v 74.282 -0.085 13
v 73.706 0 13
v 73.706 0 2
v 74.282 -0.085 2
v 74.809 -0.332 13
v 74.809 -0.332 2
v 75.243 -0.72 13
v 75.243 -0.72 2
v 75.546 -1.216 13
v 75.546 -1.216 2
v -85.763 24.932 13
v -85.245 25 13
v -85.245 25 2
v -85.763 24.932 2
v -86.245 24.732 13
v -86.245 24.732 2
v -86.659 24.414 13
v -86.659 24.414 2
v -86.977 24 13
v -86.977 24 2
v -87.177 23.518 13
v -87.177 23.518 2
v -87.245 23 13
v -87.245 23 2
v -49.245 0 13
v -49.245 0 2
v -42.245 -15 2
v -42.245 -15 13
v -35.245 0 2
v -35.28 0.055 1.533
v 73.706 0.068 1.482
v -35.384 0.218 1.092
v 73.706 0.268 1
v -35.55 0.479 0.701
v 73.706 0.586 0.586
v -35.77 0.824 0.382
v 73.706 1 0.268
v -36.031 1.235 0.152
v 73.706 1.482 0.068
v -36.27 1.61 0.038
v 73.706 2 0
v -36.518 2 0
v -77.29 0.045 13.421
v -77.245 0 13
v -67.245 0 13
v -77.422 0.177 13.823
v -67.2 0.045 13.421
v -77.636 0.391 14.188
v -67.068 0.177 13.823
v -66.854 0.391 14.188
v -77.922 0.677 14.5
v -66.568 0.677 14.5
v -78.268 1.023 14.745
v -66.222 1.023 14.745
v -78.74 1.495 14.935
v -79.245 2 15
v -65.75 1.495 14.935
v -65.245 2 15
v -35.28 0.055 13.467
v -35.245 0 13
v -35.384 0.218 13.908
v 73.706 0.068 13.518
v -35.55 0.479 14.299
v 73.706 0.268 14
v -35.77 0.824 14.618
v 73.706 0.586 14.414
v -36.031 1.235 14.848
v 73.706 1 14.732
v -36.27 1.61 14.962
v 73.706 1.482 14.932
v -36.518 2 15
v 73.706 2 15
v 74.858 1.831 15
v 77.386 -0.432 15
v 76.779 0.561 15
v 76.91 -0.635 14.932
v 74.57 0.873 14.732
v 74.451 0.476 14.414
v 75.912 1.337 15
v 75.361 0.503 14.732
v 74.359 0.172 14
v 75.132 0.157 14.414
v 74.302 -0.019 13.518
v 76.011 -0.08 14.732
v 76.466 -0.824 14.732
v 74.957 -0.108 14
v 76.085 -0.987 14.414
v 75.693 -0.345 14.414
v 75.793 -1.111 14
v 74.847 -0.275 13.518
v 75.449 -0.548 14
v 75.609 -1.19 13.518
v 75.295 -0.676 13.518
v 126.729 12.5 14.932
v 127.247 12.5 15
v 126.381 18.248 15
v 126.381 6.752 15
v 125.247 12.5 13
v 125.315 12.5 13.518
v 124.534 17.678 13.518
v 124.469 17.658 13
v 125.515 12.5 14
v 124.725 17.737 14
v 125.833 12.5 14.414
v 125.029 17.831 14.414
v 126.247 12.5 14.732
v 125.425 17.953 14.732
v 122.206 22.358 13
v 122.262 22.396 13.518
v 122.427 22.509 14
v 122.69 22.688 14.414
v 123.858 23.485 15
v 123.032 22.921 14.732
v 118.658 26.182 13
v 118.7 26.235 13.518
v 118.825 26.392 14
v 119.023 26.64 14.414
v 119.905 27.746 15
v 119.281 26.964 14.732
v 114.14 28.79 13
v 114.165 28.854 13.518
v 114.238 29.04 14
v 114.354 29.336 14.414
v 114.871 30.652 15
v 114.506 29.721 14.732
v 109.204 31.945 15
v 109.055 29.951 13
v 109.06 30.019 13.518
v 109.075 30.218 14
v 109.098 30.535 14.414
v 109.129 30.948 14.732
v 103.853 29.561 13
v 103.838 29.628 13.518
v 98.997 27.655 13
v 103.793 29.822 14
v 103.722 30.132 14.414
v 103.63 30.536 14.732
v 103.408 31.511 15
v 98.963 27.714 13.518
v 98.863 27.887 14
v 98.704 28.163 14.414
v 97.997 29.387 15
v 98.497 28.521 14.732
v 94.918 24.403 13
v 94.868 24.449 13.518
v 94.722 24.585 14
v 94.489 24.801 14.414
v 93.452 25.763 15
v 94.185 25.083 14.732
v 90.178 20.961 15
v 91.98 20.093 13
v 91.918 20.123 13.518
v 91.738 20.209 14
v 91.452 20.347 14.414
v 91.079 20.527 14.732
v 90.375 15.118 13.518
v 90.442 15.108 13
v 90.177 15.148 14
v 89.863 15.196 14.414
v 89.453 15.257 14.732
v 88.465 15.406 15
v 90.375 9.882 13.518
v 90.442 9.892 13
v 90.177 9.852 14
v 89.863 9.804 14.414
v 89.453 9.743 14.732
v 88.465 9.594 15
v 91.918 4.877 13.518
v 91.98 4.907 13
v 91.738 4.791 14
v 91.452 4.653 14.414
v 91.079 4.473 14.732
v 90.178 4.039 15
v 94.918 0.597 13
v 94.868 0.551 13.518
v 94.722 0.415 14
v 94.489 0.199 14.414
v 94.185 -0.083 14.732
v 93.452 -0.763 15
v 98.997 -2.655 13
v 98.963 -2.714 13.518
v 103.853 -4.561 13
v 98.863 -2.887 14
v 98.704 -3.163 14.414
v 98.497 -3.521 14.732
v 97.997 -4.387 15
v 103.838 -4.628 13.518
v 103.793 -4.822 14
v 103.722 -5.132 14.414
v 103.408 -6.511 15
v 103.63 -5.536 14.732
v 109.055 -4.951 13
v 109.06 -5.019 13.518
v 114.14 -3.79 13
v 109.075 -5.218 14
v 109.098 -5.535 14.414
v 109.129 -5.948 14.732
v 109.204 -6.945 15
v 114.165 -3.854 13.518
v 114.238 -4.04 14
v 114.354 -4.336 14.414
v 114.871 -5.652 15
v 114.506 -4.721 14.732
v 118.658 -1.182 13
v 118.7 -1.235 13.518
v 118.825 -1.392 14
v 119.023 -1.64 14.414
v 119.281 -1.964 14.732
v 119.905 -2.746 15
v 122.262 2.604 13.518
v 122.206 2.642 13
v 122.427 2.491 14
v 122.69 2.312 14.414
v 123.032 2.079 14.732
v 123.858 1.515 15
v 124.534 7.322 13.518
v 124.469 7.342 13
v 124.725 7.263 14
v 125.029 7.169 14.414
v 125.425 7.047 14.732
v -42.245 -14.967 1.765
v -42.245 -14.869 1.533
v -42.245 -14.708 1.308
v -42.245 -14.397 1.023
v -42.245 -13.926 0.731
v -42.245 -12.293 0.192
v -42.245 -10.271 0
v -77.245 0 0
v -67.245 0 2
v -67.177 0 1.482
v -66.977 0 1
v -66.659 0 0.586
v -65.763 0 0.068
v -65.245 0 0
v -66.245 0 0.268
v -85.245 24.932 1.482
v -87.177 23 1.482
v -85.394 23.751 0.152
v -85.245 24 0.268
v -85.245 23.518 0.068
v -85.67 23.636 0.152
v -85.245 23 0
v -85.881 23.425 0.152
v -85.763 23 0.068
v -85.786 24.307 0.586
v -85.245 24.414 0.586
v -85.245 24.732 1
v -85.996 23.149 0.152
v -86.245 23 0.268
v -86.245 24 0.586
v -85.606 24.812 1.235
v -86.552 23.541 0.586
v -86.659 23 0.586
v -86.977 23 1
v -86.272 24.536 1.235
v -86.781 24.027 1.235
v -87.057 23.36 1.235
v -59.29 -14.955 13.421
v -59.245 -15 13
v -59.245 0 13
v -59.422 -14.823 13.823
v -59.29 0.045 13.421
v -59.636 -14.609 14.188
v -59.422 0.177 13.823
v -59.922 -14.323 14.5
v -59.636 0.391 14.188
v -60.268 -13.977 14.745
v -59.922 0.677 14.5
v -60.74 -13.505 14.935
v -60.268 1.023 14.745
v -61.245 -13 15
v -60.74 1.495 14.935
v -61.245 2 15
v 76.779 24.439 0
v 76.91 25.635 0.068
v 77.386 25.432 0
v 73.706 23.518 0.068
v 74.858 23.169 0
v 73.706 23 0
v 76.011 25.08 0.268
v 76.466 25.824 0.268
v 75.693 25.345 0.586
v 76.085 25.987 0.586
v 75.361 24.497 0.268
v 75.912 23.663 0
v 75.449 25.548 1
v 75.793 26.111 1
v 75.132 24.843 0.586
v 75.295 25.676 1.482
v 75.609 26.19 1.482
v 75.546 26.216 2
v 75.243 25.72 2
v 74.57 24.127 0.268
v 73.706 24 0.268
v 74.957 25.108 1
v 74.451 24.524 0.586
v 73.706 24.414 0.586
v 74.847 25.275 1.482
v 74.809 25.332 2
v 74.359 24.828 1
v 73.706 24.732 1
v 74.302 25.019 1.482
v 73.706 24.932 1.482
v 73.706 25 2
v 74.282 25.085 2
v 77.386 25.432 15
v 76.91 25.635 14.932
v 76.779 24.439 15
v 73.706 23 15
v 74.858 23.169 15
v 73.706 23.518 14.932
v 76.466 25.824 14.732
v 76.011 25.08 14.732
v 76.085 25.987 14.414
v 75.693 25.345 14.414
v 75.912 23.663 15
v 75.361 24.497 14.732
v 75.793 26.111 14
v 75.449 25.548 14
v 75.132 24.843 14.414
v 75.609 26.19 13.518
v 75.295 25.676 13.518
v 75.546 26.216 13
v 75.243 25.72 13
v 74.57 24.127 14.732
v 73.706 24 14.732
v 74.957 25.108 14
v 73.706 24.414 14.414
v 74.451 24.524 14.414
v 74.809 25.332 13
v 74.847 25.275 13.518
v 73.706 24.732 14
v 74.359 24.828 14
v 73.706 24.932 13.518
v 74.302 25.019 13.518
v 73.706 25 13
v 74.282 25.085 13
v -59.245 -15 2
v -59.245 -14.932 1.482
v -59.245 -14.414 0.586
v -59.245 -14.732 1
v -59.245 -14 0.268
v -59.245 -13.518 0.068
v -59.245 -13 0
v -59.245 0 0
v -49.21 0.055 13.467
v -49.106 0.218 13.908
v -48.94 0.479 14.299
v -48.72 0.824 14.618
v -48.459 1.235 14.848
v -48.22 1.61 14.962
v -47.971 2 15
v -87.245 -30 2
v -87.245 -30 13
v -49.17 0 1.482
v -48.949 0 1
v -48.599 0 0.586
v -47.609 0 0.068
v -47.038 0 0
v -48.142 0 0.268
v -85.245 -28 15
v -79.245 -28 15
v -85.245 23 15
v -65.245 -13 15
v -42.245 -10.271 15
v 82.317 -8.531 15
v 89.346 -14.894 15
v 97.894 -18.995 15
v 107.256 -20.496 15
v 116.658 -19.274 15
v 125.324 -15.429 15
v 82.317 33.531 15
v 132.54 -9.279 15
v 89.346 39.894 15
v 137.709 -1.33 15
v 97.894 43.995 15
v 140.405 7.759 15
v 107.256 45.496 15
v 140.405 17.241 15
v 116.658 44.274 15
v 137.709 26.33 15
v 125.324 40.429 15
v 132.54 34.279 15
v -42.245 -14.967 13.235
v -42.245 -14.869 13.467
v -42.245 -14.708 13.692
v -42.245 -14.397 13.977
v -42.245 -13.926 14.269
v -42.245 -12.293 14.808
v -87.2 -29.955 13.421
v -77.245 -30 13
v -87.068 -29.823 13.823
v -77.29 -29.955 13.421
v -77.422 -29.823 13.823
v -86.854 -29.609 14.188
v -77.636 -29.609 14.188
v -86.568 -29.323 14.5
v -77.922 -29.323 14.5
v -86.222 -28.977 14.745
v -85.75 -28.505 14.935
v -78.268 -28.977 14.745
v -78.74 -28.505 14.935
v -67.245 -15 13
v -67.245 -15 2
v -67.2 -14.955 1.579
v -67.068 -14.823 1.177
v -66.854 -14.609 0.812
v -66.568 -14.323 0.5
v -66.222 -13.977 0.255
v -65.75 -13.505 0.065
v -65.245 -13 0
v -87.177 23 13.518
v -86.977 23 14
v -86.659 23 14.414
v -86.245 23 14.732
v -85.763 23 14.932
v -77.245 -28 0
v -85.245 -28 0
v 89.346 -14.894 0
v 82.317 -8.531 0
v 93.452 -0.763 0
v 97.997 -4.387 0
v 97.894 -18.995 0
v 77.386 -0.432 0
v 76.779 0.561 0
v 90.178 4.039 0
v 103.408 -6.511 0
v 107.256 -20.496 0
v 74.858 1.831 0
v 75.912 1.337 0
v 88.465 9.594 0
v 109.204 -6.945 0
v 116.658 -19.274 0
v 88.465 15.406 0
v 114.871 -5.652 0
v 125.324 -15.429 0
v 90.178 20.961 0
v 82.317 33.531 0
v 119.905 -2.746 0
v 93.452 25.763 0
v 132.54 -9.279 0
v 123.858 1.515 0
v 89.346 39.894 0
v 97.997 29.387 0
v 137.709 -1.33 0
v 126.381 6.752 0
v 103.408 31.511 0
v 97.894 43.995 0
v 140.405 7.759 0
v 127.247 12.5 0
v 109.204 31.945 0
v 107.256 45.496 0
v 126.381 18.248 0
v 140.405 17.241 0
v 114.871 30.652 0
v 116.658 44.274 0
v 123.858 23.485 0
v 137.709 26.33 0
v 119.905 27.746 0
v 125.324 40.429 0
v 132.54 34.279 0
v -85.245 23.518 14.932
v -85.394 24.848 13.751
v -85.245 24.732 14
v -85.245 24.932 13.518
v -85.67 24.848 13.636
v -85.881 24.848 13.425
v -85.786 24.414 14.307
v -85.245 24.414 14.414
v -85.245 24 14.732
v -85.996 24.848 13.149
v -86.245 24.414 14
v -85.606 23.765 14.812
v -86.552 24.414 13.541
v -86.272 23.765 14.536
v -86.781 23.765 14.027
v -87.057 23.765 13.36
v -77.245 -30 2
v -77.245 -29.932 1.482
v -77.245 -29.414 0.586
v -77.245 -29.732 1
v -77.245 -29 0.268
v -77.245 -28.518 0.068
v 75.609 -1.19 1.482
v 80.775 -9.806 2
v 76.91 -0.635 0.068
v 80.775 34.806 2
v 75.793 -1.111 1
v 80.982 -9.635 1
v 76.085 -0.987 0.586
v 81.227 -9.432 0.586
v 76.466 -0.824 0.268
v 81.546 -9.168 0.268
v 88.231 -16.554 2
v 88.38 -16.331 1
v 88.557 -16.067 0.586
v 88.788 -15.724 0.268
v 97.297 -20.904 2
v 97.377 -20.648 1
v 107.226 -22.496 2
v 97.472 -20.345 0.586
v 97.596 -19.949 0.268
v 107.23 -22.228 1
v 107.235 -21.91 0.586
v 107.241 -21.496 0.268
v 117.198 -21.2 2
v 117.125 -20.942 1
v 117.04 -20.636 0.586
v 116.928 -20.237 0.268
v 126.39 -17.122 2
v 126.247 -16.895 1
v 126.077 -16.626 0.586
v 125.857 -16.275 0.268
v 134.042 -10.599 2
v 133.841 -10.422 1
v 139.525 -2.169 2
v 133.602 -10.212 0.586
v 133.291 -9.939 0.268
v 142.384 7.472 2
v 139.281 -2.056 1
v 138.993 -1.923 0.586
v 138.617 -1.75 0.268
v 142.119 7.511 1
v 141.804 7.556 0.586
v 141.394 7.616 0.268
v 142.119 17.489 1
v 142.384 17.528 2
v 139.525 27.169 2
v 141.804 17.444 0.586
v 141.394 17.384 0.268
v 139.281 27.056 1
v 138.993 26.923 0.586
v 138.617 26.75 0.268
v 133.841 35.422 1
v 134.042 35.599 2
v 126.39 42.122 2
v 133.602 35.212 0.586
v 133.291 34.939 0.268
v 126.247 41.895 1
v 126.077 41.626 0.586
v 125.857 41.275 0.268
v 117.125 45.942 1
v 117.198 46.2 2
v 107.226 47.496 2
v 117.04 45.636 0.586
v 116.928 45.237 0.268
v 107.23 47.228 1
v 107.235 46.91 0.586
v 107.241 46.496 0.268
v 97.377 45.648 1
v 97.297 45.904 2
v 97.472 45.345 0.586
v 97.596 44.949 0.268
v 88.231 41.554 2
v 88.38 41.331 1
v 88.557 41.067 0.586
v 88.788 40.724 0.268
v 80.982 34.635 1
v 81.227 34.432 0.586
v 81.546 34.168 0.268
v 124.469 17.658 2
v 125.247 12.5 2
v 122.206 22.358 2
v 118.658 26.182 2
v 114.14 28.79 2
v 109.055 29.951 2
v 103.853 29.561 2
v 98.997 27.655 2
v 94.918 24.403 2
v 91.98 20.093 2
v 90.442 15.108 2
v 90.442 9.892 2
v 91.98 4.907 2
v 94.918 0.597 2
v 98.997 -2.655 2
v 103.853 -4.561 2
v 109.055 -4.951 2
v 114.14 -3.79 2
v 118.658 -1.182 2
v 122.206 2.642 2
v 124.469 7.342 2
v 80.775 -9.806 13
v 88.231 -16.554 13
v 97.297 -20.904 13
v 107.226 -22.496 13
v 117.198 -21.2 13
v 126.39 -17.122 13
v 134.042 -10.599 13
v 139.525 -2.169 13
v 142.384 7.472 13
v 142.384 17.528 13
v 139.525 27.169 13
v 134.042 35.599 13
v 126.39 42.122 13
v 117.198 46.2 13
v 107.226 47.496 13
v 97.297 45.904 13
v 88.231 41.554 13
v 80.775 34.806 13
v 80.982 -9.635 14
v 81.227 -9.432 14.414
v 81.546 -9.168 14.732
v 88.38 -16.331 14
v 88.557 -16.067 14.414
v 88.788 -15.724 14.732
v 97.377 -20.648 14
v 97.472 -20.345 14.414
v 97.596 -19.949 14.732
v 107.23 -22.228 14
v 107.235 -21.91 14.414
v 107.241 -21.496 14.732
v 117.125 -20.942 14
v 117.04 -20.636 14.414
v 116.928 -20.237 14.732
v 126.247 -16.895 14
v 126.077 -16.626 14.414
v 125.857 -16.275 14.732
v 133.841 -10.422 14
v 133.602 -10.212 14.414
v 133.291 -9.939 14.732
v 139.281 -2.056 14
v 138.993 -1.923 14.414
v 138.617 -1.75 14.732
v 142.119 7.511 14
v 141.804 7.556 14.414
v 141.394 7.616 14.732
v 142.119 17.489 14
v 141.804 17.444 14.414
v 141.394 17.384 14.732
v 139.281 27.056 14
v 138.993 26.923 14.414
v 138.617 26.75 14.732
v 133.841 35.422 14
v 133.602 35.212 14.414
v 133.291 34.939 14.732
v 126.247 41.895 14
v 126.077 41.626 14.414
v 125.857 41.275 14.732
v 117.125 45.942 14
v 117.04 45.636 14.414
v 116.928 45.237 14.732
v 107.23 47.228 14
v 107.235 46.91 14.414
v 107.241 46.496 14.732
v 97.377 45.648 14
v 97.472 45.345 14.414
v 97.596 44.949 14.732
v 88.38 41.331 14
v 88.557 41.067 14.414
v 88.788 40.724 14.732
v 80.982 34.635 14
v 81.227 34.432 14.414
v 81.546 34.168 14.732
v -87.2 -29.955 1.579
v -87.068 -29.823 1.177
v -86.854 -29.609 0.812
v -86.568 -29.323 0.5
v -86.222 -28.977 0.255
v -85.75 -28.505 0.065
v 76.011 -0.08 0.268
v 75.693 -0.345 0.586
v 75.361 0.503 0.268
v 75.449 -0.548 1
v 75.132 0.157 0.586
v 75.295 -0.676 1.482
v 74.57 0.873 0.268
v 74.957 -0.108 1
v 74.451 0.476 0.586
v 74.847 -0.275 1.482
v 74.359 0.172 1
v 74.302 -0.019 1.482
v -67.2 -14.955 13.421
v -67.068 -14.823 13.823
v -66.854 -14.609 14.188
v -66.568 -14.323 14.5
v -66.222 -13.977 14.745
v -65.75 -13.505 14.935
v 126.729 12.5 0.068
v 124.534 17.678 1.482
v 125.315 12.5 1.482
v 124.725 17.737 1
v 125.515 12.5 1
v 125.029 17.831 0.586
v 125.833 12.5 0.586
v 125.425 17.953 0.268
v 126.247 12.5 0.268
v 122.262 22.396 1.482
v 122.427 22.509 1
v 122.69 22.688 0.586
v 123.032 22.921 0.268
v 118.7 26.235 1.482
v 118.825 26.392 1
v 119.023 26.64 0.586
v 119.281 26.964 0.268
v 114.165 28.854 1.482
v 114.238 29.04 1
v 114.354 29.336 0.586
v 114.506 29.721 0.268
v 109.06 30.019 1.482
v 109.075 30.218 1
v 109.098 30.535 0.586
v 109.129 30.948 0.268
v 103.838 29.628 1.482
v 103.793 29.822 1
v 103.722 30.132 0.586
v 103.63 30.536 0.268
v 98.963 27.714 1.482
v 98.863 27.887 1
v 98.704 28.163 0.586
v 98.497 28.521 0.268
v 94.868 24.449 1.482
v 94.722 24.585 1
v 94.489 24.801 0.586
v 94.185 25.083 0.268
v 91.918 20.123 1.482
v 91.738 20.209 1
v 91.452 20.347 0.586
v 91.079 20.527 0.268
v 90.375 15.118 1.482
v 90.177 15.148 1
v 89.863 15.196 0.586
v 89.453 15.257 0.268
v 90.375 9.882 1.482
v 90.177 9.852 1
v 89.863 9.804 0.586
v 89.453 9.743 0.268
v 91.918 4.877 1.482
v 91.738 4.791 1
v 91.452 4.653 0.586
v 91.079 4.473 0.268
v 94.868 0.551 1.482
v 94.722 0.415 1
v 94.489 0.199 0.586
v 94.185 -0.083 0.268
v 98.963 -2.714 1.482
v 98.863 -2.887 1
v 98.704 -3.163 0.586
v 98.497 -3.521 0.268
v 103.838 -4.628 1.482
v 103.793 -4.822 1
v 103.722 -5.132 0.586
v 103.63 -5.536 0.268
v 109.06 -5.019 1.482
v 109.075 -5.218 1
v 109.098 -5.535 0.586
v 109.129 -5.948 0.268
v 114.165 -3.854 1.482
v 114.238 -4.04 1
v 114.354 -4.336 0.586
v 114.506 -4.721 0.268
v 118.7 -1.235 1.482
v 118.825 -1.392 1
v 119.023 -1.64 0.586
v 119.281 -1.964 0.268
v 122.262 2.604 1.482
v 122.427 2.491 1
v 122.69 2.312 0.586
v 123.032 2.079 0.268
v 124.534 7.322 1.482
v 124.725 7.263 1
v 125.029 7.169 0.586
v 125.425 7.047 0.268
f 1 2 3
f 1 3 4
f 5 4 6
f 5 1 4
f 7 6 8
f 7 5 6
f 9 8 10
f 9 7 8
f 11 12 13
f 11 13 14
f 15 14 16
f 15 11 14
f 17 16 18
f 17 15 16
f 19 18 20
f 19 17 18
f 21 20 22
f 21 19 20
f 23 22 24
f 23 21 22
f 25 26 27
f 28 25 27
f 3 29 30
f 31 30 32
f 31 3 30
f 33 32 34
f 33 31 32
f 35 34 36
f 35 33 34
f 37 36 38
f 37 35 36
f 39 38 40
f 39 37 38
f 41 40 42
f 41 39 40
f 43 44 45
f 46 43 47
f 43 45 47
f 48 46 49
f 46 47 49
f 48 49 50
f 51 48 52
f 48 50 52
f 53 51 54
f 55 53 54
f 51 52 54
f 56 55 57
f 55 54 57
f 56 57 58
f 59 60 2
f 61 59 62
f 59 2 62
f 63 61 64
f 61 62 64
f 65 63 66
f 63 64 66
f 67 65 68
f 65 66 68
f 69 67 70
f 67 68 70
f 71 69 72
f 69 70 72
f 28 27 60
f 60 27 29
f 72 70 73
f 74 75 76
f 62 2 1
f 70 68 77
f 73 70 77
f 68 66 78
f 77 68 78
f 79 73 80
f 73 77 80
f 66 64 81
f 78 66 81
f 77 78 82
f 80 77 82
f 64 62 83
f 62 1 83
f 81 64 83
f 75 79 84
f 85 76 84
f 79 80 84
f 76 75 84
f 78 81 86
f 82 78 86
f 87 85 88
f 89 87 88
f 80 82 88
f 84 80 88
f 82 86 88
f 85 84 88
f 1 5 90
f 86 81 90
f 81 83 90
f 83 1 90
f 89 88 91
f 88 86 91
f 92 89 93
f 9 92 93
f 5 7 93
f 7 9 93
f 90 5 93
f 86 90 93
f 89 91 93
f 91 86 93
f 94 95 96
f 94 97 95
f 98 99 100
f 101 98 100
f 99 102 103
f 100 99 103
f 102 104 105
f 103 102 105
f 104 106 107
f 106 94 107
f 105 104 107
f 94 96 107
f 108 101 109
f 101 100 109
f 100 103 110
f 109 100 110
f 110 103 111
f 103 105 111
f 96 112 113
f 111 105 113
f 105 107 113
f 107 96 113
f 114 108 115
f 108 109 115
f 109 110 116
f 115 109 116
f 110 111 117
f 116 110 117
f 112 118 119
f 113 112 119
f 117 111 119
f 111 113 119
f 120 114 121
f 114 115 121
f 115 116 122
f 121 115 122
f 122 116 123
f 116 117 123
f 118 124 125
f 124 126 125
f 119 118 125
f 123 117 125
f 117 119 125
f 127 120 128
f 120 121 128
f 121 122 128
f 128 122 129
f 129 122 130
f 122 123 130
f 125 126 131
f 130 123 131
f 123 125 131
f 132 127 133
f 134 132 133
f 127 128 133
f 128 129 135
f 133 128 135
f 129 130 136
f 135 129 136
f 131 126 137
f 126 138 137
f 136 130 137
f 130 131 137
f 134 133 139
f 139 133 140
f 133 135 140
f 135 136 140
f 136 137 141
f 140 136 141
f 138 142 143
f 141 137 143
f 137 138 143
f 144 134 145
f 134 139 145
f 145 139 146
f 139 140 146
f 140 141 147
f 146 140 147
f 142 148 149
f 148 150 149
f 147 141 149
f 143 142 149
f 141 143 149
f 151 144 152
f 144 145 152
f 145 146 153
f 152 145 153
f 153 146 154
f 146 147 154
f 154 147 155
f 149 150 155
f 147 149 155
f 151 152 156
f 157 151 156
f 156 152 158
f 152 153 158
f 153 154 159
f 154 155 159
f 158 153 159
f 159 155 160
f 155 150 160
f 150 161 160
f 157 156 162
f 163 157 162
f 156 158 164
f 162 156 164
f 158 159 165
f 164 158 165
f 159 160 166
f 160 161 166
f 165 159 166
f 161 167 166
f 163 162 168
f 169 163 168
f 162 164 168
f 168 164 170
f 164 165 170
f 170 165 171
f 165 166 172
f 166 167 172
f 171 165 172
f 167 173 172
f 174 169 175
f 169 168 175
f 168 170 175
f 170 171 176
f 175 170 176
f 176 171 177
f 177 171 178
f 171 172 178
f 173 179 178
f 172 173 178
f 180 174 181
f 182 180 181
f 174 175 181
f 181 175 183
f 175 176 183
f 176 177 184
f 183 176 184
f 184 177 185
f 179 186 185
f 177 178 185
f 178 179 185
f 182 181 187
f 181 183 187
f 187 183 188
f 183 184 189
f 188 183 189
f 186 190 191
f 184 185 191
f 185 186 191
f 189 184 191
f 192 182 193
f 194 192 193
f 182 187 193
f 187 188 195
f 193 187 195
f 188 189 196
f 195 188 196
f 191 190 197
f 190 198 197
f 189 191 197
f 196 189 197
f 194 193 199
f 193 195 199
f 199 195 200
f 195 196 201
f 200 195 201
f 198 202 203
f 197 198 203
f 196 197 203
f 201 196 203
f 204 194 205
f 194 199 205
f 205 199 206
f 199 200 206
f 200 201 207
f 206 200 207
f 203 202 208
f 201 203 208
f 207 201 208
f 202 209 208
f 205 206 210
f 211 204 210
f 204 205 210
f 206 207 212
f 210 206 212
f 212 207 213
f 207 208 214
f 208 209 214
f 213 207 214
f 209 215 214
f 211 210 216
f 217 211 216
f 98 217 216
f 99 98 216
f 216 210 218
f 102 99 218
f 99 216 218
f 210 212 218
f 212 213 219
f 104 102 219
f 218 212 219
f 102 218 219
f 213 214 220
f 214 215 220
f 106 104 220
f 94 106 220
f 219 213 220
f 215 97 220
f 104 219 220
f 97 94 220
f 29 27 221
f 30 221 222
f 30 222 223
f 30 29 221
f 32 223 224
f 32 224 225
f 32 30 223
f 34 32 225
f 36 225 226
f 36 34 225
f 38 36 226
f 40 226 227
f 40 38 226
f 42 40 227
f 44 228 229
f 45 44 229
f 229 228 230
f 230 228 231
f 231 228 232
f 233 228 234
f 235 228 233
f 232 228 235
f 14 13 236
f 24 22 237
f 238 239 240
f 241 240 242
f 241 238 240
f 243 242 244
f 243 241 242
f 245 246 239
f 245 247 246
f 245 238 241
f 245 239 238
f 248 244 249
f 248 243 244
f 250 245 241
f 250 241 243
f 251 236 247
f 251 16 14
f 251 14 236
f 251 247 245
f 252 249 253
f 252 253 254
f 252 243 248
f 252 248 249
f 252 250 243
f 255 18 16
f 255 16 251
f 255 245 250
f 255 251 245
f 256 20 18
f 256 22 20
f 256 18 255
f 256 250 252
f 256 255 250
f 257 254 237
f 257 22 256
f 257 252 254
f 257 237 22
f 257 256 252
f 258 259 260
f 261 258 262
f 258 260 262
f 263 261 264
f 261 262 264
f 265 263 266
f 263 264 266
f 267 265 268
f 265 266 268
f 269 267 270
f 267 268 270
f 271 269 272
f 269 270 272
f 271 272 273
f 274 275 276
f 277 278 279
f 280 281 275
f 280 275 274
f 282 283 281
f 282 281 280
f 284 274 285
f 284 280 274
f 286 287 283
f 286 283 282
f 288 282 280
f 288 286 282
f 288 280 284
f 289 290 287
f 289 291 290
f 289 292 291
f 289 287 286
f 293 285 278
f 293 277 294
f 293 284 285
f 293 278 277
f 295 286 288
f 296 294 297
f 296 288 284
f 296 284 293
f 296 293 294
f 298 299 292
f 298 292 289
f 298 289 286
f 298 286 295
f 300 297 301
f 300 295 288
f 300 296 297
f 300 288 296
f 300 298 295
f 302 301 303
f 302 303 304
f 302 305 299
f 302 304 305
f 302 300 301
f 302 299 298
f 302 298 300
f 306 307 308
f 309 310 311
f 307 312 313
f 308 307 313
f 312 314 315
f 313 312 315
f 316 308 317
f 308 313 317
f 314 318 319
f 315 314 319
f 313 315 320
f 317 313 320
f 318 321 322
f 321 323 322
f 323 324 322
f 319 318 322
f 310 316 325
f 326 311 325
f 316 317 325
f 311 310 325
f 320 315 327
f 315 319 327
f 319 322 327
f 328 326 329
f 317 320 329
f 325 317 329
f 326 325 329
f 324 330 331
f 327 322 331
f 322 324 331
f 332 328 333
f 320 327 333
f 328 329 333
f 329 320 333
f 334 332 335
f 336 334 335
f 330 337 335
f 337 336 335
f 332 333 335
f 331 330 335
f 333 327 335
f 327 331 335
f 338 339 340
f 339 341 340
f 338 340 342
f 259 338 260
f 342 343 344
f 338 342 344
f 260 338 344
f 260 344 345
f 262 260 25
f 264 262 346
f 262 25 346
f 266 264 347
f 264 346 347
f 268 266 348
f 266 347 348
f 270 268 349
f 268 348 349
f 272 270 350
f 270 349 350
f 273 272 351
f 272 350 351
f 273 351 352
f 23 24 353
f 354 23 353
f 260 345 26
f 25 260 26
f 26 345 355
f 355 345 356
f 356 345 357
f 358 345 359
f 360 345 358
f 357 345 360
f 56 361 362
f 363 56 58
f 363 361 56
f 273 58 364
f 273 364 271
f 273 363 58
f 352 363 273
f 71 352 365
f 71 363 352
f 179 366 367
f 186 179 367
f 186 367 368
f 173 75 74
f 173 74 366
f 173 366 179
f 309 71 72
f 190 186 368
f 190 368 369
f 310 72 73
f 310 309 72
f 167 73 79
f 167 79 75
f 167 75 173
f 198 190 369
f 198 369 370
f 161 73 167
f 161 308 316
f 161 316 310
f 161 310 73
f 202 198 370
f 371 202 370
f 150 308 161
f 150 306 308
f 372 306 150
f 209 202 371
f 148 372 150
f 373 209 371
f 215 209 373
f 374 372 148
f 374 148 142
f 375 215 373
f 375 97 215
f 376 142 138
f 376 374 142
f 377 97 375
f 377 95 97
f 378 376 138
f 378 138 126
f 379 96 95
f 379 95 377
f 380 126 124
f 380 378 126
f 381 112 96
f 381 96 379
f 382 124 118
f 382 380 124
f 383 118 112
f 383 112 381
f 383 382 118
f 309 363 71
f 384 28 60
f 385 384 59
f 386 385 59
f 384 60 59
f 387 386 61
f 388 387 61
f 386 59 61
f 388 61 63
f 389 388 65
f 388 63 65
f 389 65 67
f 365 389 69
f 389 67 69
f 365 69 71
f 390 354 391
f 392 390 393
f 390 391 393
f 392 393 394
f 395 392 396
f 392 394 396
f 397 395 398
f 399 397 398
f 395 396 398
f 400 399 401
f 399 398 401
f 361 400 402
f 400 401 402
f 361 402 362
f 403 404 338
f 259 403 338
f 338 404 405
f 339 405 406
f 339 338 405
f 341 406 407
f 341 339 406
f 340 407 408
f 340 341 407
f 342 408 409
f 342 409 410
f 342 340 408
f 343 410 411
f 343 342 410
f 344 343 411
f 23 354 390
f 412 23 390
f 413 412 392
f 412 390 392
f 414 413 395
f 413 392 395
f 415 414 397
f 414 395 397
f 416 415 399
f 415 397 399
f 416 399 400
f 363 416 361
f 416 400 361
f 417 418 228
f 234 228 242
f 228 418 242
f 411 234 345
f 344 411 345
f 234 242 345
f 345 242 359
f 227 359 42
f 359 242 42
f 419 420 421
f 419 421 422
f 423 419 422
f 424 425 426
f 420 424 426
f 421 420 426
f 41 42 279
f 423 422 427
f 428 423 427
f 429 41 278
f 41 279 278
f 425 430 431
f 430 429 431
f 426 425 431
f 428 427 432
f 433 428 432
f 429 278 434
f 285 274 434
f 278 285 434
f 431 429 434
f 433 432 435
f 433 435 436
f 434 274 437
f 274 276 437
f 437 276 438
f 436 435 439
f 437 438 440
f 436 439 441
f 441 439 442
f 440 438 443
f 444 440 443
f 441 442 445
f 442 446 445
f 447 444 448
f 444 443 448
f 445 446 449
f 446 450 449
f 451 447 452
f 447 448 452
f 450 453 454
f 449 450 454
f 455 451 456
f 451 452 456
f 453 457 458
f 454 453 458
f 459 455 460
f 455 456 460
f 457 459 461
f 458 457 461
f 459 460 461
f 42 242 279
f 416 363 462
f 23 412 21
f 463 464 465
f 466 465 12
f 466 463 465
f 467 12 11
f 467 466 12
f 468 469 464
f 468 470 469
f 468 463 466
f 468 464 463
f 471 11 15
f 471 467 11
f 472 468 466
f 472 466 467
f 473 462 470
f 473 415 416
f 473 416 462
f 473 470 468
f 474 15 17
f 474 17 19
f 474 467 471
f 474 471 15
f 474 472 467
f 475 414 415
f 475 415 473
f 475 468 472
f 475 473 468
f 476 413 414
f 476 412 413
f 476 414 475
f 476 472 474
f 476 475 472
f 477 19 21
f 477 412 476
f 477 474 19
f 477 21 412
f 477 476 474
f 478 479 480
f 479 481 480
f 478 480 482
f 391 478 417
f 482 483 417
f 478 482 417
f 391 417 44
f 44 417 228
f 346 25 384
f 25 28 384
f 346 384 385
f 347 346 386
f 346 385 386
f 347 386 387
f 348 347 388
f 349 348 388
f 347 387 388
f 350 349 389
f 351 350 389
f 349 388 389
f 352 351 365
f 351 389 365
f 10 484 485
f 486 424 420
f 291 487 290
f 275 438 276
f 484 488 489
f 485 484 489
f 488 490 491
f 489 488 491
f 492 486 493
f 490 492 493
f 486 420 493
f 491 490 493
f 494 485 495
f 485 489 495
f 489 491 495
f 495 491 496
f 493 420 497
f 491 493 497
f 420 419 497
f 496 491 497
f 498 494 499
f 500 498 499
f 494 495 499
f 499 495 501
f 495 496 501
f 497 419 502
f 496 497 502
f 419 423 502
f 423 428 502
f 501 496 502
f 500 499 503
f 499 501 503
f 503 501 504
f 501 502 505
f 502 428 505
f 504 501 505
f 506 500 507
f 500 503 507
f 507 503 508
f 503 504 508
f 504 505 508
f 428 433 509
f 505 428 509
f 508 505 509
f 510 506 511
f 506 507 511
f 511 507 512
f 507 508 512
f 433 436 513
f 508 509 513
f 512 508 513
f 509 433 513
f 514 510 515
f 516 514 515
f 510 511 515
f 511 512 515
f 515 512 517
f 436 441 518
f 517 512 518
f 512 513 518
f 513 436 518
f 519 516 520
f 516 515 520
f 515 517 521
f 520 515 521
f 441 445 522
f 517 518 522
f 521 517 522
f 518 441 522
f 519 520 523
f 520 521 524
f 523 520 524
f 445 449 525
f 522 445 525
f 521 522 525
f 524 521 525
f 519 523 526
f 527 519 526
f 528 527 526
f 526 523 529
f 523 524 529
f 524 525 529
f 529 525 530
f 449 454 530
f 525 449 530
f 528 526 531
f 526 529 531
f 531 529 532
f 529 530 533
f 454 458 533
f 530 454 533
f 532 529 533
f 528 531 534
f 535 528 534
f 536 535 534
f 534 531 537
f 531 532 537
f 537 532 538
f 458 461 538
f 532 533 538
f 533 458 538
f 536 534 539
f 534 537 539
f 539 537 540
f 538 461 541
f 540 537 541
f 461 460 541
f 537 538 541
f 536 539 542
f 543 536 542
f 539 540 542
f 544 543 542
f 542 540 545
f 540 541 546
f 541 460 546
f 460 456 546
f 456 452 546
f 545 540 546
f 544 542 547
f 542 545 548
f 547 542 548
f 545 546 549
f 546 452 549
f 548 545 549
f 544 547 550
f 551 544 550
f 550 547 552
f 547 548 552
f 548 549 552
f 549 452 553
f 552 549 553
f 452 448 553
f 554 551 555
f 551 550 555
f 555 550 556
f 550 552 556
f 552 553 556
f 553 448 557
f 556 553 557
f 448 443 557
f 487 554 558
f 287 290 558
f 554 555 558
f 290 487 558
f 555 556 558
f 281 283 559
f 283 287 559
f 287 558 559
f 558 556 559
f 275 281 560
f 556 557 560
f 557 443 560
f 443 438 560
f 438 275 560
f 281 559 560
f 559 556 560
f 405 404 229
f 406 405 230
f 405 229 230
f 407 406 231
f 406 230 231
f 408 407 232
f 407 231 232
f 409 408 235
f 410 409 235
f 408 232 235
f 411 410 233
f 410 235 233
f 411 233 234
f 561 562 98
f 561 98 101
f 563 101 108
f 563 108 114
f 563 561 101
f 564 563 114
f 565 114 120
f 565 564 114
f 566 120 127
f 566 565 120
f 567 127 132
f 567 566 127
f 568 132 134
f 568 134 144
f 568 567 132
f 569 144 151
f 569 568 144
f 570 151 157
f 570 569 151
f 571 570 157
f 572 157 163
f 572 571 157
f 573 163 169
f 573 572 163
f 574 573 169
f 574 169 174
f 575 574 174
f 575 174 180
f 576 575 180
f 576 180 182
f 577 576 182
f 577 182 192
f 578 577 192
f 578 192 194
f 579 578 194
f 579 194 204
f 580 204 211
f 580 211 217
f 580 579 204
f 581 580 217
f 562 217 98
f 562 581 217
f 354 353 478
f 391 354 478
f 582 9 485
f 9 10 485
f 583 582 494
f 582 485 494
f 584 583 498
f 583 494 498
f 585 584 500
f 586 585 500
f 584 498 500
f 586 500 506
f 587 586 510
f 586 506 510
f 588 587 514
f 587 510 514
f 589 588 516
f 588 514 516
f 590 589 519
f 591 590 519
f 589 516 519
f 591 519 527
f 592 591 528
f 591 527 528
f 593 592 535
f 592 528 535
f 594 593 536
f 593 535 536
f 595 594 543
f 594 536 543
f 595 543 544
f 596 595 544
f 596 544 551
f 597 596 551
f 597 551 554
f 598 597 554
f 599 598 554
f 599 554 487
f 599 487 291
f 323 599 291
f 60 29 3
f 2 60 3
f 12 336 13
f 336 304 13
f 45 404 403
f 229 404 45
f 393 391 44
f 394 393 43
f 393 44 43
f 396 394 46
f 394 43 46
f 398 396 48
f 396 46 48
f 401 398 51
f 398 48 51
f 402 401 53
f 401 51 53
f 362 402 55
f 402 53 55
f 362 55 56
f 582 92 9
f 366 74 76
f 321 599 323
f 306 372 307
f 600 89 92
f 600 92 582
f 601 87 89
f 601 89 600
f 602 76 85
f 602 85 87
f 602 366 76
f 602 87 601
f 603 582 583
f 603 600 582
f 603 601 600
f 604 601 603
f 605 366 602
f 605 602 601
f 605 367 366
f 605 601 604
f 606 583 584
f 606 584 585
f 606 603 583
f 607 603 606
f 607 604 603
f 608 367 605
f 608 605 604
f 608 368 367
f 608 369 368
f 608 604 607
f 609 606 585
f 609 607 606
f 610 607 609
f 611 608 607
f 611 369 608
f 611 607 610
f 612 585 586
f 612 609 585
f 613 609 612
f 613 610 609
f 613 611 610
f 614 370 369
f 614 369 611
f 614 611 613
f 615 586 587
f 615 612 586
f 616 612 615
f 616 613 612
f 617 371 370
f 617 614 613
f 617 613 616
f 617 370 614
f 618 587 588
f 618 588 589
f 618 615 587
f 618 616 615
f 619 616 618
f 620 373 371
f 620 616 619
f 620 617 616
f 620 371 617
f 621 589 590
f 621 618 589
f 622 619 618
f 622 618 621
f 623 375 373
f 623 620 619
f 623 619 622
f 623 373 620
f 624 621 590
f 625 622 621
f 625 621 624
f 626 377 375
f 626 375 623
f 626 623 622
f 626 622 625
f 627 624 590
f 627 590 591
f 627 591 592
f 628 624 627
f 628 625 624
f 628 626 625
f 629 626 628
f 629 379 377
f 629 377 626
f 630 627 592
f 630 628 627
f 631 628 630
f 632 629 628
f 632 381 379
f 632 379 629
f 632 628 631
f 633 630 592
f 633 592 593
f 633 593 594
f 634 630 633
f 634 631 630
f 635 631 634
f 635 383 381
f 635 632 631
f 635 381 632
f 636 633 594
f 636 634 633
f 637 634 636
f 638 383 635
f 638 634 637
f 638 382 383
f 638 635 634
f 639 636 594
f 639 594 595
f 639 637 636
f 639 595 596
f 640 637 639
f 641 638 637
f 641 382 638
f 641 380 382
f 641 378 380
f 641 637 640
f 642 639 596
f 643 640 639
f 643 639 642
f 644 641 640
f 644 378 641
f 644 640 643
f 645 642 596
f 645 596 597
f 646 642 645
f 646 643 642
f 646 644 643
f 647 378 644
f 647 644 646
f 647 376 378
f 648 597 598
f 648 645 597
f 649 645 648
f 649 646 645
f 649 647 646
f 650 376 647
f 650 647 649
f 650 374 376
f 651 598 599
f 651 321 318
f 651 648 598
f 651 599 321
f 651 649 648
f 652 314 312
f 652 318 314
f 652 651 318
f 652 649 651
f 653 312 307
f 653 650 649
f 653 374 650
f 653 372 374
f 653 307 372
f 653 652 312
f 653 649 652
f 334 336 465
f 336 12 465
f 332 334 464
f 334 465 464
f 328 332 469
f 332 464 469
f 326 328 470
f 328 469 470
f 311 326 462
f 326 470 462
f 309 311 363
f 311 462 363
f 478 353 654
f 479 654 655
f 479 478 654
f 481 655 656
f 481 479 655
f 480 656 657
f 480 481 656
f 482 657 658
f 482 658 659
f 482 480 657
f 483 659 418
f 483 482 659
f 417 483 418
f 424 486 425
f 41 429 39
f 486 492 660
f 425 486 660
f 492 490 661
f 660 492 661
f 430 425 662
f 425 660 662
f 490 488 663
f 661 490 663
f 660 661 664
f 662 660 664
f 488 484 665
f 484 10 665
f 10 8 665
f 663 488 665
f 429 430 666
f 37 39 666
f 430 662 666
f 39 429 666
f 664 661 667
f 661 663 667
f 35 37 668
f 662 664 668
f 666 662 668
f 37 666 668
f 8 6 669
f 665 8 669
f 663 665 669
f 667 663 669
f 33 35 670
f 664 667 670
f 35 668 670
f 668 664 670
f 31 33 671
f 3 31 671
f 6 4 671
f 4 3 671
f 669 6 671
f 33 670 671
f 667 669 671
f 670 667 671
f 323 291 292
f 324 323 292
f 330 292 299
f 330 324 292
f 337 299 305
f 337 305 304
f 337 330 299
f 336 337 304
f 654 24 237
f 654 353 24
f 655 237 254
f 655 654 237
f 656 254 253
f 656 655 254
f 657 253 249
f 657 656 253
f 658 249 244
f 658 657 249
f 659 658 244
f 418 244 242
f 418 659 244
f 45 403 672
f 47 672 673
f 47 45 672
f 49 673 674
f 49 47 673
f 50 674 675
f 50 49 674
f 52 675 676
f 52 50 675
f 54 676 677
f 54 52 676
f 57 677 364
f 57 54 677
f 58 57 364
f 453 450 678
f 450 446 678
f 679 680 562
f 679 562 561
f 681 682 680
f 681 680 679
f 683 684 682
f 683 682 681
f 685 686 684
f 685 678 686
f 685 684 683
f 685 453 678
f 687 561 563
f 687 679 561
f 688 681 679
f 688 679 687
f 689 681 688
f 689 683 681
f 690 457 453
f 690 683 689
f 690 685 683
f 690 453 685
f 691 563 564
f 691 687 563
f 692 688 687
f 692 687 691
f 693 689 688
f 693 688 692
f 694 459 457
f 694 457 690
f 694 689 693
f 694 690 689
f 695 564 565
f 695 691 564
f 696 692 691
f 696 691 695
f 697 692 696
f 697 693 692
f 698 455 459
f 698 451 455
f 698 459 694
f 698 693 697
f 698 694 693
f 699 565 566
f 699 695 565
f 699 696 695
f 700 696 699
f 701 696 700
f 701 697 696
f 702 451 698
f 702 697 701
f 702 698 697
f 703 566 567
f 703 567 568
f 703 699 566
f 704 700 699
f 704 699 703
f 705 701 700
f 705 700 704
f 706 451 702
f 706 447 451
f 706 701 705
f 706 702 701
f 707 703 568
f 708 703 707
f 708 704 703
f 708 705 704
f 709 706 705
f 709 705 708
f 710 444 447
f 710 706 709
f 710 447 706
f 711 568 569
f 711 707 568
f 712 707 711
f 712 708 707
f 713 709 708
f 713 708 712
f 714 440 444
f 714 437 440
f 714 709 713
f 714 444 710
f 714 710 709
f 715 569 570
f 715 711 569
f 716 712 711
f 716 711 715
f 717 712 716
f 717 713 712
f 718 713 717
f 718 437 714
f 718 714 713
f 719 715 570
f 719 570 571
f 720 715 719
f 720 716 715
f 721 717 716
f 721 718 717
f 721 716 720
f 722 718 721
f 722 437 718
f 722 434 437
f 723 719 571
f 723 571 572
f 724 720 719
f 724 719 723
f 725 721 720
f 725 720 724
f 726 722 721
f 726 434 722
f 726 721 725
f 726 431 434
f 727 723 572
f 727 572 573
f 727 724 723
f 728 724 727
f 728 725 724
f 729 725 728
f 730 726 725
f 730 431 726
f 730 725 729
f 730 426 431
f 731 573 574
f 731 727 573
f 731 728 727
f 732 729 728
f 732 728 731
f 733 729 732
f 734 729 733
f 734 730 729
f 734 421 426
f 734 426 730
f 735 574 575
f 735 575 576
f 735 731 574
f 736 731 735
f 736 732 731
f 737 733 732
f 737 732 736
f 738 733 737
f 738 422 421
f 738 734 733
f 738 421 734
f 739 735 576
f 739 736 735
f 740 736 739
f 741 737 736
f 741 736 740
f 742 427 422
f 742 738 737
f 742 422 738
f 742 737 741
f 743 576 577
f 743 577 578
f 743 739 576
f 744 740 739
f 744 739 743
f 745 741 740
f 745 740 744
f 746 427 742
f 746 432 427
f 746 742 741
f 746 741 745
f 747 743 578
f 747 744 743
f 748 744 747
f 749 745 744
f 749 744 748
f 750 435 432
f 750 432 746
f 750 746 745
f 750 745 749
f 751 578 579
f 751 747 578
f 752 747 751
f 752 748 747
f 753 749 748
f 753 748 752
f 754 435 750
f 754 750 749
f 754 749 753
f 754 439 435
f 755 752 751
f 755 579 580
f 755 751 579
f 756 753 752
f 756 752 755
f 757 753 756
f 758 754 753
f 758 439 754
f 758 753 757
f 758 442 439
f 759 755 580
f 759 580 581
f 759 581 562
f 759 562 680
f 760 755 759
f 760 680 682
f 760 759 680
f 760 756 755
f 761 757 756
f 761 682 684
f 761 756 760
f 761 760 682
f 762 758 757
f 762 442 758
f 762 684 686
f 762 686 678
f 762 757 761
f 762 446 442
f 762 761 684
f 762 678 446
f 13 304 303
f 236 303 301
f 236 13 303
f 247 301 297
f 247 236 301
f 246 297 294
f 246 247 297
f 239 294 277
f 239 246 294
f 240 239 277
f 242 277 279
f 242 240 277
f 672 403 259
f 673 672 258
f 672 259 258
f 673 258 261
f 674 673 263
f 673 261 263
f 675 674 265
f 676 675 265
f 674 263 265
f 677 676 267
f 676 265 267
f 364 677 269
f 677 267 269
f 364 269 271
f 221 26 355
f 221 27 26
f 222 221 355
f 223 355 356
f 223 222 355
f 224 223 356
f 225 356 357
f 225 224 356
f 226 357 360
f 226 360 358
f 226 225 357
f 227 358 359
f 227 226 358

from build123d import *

# Parameters (mm, degrees)
F0_W     = 10
F0_H     = 30
F0_R     = 17.5
F0_W_2   = 8
F0_H_2   = 15
F1_DEPTH = 15
F2_R     = 2


with BuildPart() as f1:
    # F0 (on Top) → F1 (new body)
    with BuildSketch(Plane.XY):
        with Locations((-82.245037, -15)):
            Rectangle(F0_W, F0_H)
        Polygon((-42.244907, -15), (-35.244778, 0), (-49.245037, 0), align=None)
        with BuildLine():
            Line((75.0551, 25), (-87.245037, 25))
            Line((-87.245037, 25), (-87.245037, 0))
            Line((-87.245037, 0), (-77.245037, 0))
            Line((-77.245037, 0), (-67.245037, 0))
            Line((-67.245037, 0), (-59.245037, 0))
            Line((-59.245037, 0), (-49.245037, 0))
            Line((-49.245037, 0), (-35.244778, 0))
            Line((-35.244778, 0), (75.0551, 0))
            ThreePointArc((75.0551, 0), (142.746842, 12.5), (75.0551, 25))
        make_face()
        with Locations((107.746842, 12.5)):
            Circle(F0_R, mode=Mode.SUBTRACT)
        with Locations((-63.245037, -7.5)):
            Rectangle(F0_W_2, F0_H_2)
    extrude(amount=F1_DEPTH)

    # F2
    f2_edges = [f1.edges().sort_by_distance(p)[0] for p in [
        (-87.245037, -2.5, 15),
        (-82.245037, -30, 15),
        (-77.245037, -15, 15),
        (-72.245037, 0, 15),
        (-67.245037, -7.5, 15),
        (-63.245037, -15, 15),
        (-59.245037, -7.5, 15),
        (-54.245037, 0, 15),
        (-45.744972, -7.5, 15),
        (-38.744843, -7.5, 15),
        (19.905161, 0, 15),
        (142.746842, 12.5, 15),
        (-6.094968, 25, 15),
        (90.246842, 12.5, 15),
        (19.905161, 0, 0),
        (75.0551, 0, 7.5),
        (75.0551, 25, 7.5),
        (142.746842, 12.5, 0),
        (-38.744843, -7.5, 0),
        (-45.744972, -7.5, 0),
        (-63.245037, -15, 0),
        (-82.245037, -30, 0),
        (-87.245037, 25, 7.5),
        (-6.094968, 25, 0),
        (-67.245037, -7.5, 0),
        (-87.245037, -2.5, 0),
        (90.246842, 12.5, 0),
    ]]
    fillet(f2_edges, radius=F2_R)


solid = f1.part
